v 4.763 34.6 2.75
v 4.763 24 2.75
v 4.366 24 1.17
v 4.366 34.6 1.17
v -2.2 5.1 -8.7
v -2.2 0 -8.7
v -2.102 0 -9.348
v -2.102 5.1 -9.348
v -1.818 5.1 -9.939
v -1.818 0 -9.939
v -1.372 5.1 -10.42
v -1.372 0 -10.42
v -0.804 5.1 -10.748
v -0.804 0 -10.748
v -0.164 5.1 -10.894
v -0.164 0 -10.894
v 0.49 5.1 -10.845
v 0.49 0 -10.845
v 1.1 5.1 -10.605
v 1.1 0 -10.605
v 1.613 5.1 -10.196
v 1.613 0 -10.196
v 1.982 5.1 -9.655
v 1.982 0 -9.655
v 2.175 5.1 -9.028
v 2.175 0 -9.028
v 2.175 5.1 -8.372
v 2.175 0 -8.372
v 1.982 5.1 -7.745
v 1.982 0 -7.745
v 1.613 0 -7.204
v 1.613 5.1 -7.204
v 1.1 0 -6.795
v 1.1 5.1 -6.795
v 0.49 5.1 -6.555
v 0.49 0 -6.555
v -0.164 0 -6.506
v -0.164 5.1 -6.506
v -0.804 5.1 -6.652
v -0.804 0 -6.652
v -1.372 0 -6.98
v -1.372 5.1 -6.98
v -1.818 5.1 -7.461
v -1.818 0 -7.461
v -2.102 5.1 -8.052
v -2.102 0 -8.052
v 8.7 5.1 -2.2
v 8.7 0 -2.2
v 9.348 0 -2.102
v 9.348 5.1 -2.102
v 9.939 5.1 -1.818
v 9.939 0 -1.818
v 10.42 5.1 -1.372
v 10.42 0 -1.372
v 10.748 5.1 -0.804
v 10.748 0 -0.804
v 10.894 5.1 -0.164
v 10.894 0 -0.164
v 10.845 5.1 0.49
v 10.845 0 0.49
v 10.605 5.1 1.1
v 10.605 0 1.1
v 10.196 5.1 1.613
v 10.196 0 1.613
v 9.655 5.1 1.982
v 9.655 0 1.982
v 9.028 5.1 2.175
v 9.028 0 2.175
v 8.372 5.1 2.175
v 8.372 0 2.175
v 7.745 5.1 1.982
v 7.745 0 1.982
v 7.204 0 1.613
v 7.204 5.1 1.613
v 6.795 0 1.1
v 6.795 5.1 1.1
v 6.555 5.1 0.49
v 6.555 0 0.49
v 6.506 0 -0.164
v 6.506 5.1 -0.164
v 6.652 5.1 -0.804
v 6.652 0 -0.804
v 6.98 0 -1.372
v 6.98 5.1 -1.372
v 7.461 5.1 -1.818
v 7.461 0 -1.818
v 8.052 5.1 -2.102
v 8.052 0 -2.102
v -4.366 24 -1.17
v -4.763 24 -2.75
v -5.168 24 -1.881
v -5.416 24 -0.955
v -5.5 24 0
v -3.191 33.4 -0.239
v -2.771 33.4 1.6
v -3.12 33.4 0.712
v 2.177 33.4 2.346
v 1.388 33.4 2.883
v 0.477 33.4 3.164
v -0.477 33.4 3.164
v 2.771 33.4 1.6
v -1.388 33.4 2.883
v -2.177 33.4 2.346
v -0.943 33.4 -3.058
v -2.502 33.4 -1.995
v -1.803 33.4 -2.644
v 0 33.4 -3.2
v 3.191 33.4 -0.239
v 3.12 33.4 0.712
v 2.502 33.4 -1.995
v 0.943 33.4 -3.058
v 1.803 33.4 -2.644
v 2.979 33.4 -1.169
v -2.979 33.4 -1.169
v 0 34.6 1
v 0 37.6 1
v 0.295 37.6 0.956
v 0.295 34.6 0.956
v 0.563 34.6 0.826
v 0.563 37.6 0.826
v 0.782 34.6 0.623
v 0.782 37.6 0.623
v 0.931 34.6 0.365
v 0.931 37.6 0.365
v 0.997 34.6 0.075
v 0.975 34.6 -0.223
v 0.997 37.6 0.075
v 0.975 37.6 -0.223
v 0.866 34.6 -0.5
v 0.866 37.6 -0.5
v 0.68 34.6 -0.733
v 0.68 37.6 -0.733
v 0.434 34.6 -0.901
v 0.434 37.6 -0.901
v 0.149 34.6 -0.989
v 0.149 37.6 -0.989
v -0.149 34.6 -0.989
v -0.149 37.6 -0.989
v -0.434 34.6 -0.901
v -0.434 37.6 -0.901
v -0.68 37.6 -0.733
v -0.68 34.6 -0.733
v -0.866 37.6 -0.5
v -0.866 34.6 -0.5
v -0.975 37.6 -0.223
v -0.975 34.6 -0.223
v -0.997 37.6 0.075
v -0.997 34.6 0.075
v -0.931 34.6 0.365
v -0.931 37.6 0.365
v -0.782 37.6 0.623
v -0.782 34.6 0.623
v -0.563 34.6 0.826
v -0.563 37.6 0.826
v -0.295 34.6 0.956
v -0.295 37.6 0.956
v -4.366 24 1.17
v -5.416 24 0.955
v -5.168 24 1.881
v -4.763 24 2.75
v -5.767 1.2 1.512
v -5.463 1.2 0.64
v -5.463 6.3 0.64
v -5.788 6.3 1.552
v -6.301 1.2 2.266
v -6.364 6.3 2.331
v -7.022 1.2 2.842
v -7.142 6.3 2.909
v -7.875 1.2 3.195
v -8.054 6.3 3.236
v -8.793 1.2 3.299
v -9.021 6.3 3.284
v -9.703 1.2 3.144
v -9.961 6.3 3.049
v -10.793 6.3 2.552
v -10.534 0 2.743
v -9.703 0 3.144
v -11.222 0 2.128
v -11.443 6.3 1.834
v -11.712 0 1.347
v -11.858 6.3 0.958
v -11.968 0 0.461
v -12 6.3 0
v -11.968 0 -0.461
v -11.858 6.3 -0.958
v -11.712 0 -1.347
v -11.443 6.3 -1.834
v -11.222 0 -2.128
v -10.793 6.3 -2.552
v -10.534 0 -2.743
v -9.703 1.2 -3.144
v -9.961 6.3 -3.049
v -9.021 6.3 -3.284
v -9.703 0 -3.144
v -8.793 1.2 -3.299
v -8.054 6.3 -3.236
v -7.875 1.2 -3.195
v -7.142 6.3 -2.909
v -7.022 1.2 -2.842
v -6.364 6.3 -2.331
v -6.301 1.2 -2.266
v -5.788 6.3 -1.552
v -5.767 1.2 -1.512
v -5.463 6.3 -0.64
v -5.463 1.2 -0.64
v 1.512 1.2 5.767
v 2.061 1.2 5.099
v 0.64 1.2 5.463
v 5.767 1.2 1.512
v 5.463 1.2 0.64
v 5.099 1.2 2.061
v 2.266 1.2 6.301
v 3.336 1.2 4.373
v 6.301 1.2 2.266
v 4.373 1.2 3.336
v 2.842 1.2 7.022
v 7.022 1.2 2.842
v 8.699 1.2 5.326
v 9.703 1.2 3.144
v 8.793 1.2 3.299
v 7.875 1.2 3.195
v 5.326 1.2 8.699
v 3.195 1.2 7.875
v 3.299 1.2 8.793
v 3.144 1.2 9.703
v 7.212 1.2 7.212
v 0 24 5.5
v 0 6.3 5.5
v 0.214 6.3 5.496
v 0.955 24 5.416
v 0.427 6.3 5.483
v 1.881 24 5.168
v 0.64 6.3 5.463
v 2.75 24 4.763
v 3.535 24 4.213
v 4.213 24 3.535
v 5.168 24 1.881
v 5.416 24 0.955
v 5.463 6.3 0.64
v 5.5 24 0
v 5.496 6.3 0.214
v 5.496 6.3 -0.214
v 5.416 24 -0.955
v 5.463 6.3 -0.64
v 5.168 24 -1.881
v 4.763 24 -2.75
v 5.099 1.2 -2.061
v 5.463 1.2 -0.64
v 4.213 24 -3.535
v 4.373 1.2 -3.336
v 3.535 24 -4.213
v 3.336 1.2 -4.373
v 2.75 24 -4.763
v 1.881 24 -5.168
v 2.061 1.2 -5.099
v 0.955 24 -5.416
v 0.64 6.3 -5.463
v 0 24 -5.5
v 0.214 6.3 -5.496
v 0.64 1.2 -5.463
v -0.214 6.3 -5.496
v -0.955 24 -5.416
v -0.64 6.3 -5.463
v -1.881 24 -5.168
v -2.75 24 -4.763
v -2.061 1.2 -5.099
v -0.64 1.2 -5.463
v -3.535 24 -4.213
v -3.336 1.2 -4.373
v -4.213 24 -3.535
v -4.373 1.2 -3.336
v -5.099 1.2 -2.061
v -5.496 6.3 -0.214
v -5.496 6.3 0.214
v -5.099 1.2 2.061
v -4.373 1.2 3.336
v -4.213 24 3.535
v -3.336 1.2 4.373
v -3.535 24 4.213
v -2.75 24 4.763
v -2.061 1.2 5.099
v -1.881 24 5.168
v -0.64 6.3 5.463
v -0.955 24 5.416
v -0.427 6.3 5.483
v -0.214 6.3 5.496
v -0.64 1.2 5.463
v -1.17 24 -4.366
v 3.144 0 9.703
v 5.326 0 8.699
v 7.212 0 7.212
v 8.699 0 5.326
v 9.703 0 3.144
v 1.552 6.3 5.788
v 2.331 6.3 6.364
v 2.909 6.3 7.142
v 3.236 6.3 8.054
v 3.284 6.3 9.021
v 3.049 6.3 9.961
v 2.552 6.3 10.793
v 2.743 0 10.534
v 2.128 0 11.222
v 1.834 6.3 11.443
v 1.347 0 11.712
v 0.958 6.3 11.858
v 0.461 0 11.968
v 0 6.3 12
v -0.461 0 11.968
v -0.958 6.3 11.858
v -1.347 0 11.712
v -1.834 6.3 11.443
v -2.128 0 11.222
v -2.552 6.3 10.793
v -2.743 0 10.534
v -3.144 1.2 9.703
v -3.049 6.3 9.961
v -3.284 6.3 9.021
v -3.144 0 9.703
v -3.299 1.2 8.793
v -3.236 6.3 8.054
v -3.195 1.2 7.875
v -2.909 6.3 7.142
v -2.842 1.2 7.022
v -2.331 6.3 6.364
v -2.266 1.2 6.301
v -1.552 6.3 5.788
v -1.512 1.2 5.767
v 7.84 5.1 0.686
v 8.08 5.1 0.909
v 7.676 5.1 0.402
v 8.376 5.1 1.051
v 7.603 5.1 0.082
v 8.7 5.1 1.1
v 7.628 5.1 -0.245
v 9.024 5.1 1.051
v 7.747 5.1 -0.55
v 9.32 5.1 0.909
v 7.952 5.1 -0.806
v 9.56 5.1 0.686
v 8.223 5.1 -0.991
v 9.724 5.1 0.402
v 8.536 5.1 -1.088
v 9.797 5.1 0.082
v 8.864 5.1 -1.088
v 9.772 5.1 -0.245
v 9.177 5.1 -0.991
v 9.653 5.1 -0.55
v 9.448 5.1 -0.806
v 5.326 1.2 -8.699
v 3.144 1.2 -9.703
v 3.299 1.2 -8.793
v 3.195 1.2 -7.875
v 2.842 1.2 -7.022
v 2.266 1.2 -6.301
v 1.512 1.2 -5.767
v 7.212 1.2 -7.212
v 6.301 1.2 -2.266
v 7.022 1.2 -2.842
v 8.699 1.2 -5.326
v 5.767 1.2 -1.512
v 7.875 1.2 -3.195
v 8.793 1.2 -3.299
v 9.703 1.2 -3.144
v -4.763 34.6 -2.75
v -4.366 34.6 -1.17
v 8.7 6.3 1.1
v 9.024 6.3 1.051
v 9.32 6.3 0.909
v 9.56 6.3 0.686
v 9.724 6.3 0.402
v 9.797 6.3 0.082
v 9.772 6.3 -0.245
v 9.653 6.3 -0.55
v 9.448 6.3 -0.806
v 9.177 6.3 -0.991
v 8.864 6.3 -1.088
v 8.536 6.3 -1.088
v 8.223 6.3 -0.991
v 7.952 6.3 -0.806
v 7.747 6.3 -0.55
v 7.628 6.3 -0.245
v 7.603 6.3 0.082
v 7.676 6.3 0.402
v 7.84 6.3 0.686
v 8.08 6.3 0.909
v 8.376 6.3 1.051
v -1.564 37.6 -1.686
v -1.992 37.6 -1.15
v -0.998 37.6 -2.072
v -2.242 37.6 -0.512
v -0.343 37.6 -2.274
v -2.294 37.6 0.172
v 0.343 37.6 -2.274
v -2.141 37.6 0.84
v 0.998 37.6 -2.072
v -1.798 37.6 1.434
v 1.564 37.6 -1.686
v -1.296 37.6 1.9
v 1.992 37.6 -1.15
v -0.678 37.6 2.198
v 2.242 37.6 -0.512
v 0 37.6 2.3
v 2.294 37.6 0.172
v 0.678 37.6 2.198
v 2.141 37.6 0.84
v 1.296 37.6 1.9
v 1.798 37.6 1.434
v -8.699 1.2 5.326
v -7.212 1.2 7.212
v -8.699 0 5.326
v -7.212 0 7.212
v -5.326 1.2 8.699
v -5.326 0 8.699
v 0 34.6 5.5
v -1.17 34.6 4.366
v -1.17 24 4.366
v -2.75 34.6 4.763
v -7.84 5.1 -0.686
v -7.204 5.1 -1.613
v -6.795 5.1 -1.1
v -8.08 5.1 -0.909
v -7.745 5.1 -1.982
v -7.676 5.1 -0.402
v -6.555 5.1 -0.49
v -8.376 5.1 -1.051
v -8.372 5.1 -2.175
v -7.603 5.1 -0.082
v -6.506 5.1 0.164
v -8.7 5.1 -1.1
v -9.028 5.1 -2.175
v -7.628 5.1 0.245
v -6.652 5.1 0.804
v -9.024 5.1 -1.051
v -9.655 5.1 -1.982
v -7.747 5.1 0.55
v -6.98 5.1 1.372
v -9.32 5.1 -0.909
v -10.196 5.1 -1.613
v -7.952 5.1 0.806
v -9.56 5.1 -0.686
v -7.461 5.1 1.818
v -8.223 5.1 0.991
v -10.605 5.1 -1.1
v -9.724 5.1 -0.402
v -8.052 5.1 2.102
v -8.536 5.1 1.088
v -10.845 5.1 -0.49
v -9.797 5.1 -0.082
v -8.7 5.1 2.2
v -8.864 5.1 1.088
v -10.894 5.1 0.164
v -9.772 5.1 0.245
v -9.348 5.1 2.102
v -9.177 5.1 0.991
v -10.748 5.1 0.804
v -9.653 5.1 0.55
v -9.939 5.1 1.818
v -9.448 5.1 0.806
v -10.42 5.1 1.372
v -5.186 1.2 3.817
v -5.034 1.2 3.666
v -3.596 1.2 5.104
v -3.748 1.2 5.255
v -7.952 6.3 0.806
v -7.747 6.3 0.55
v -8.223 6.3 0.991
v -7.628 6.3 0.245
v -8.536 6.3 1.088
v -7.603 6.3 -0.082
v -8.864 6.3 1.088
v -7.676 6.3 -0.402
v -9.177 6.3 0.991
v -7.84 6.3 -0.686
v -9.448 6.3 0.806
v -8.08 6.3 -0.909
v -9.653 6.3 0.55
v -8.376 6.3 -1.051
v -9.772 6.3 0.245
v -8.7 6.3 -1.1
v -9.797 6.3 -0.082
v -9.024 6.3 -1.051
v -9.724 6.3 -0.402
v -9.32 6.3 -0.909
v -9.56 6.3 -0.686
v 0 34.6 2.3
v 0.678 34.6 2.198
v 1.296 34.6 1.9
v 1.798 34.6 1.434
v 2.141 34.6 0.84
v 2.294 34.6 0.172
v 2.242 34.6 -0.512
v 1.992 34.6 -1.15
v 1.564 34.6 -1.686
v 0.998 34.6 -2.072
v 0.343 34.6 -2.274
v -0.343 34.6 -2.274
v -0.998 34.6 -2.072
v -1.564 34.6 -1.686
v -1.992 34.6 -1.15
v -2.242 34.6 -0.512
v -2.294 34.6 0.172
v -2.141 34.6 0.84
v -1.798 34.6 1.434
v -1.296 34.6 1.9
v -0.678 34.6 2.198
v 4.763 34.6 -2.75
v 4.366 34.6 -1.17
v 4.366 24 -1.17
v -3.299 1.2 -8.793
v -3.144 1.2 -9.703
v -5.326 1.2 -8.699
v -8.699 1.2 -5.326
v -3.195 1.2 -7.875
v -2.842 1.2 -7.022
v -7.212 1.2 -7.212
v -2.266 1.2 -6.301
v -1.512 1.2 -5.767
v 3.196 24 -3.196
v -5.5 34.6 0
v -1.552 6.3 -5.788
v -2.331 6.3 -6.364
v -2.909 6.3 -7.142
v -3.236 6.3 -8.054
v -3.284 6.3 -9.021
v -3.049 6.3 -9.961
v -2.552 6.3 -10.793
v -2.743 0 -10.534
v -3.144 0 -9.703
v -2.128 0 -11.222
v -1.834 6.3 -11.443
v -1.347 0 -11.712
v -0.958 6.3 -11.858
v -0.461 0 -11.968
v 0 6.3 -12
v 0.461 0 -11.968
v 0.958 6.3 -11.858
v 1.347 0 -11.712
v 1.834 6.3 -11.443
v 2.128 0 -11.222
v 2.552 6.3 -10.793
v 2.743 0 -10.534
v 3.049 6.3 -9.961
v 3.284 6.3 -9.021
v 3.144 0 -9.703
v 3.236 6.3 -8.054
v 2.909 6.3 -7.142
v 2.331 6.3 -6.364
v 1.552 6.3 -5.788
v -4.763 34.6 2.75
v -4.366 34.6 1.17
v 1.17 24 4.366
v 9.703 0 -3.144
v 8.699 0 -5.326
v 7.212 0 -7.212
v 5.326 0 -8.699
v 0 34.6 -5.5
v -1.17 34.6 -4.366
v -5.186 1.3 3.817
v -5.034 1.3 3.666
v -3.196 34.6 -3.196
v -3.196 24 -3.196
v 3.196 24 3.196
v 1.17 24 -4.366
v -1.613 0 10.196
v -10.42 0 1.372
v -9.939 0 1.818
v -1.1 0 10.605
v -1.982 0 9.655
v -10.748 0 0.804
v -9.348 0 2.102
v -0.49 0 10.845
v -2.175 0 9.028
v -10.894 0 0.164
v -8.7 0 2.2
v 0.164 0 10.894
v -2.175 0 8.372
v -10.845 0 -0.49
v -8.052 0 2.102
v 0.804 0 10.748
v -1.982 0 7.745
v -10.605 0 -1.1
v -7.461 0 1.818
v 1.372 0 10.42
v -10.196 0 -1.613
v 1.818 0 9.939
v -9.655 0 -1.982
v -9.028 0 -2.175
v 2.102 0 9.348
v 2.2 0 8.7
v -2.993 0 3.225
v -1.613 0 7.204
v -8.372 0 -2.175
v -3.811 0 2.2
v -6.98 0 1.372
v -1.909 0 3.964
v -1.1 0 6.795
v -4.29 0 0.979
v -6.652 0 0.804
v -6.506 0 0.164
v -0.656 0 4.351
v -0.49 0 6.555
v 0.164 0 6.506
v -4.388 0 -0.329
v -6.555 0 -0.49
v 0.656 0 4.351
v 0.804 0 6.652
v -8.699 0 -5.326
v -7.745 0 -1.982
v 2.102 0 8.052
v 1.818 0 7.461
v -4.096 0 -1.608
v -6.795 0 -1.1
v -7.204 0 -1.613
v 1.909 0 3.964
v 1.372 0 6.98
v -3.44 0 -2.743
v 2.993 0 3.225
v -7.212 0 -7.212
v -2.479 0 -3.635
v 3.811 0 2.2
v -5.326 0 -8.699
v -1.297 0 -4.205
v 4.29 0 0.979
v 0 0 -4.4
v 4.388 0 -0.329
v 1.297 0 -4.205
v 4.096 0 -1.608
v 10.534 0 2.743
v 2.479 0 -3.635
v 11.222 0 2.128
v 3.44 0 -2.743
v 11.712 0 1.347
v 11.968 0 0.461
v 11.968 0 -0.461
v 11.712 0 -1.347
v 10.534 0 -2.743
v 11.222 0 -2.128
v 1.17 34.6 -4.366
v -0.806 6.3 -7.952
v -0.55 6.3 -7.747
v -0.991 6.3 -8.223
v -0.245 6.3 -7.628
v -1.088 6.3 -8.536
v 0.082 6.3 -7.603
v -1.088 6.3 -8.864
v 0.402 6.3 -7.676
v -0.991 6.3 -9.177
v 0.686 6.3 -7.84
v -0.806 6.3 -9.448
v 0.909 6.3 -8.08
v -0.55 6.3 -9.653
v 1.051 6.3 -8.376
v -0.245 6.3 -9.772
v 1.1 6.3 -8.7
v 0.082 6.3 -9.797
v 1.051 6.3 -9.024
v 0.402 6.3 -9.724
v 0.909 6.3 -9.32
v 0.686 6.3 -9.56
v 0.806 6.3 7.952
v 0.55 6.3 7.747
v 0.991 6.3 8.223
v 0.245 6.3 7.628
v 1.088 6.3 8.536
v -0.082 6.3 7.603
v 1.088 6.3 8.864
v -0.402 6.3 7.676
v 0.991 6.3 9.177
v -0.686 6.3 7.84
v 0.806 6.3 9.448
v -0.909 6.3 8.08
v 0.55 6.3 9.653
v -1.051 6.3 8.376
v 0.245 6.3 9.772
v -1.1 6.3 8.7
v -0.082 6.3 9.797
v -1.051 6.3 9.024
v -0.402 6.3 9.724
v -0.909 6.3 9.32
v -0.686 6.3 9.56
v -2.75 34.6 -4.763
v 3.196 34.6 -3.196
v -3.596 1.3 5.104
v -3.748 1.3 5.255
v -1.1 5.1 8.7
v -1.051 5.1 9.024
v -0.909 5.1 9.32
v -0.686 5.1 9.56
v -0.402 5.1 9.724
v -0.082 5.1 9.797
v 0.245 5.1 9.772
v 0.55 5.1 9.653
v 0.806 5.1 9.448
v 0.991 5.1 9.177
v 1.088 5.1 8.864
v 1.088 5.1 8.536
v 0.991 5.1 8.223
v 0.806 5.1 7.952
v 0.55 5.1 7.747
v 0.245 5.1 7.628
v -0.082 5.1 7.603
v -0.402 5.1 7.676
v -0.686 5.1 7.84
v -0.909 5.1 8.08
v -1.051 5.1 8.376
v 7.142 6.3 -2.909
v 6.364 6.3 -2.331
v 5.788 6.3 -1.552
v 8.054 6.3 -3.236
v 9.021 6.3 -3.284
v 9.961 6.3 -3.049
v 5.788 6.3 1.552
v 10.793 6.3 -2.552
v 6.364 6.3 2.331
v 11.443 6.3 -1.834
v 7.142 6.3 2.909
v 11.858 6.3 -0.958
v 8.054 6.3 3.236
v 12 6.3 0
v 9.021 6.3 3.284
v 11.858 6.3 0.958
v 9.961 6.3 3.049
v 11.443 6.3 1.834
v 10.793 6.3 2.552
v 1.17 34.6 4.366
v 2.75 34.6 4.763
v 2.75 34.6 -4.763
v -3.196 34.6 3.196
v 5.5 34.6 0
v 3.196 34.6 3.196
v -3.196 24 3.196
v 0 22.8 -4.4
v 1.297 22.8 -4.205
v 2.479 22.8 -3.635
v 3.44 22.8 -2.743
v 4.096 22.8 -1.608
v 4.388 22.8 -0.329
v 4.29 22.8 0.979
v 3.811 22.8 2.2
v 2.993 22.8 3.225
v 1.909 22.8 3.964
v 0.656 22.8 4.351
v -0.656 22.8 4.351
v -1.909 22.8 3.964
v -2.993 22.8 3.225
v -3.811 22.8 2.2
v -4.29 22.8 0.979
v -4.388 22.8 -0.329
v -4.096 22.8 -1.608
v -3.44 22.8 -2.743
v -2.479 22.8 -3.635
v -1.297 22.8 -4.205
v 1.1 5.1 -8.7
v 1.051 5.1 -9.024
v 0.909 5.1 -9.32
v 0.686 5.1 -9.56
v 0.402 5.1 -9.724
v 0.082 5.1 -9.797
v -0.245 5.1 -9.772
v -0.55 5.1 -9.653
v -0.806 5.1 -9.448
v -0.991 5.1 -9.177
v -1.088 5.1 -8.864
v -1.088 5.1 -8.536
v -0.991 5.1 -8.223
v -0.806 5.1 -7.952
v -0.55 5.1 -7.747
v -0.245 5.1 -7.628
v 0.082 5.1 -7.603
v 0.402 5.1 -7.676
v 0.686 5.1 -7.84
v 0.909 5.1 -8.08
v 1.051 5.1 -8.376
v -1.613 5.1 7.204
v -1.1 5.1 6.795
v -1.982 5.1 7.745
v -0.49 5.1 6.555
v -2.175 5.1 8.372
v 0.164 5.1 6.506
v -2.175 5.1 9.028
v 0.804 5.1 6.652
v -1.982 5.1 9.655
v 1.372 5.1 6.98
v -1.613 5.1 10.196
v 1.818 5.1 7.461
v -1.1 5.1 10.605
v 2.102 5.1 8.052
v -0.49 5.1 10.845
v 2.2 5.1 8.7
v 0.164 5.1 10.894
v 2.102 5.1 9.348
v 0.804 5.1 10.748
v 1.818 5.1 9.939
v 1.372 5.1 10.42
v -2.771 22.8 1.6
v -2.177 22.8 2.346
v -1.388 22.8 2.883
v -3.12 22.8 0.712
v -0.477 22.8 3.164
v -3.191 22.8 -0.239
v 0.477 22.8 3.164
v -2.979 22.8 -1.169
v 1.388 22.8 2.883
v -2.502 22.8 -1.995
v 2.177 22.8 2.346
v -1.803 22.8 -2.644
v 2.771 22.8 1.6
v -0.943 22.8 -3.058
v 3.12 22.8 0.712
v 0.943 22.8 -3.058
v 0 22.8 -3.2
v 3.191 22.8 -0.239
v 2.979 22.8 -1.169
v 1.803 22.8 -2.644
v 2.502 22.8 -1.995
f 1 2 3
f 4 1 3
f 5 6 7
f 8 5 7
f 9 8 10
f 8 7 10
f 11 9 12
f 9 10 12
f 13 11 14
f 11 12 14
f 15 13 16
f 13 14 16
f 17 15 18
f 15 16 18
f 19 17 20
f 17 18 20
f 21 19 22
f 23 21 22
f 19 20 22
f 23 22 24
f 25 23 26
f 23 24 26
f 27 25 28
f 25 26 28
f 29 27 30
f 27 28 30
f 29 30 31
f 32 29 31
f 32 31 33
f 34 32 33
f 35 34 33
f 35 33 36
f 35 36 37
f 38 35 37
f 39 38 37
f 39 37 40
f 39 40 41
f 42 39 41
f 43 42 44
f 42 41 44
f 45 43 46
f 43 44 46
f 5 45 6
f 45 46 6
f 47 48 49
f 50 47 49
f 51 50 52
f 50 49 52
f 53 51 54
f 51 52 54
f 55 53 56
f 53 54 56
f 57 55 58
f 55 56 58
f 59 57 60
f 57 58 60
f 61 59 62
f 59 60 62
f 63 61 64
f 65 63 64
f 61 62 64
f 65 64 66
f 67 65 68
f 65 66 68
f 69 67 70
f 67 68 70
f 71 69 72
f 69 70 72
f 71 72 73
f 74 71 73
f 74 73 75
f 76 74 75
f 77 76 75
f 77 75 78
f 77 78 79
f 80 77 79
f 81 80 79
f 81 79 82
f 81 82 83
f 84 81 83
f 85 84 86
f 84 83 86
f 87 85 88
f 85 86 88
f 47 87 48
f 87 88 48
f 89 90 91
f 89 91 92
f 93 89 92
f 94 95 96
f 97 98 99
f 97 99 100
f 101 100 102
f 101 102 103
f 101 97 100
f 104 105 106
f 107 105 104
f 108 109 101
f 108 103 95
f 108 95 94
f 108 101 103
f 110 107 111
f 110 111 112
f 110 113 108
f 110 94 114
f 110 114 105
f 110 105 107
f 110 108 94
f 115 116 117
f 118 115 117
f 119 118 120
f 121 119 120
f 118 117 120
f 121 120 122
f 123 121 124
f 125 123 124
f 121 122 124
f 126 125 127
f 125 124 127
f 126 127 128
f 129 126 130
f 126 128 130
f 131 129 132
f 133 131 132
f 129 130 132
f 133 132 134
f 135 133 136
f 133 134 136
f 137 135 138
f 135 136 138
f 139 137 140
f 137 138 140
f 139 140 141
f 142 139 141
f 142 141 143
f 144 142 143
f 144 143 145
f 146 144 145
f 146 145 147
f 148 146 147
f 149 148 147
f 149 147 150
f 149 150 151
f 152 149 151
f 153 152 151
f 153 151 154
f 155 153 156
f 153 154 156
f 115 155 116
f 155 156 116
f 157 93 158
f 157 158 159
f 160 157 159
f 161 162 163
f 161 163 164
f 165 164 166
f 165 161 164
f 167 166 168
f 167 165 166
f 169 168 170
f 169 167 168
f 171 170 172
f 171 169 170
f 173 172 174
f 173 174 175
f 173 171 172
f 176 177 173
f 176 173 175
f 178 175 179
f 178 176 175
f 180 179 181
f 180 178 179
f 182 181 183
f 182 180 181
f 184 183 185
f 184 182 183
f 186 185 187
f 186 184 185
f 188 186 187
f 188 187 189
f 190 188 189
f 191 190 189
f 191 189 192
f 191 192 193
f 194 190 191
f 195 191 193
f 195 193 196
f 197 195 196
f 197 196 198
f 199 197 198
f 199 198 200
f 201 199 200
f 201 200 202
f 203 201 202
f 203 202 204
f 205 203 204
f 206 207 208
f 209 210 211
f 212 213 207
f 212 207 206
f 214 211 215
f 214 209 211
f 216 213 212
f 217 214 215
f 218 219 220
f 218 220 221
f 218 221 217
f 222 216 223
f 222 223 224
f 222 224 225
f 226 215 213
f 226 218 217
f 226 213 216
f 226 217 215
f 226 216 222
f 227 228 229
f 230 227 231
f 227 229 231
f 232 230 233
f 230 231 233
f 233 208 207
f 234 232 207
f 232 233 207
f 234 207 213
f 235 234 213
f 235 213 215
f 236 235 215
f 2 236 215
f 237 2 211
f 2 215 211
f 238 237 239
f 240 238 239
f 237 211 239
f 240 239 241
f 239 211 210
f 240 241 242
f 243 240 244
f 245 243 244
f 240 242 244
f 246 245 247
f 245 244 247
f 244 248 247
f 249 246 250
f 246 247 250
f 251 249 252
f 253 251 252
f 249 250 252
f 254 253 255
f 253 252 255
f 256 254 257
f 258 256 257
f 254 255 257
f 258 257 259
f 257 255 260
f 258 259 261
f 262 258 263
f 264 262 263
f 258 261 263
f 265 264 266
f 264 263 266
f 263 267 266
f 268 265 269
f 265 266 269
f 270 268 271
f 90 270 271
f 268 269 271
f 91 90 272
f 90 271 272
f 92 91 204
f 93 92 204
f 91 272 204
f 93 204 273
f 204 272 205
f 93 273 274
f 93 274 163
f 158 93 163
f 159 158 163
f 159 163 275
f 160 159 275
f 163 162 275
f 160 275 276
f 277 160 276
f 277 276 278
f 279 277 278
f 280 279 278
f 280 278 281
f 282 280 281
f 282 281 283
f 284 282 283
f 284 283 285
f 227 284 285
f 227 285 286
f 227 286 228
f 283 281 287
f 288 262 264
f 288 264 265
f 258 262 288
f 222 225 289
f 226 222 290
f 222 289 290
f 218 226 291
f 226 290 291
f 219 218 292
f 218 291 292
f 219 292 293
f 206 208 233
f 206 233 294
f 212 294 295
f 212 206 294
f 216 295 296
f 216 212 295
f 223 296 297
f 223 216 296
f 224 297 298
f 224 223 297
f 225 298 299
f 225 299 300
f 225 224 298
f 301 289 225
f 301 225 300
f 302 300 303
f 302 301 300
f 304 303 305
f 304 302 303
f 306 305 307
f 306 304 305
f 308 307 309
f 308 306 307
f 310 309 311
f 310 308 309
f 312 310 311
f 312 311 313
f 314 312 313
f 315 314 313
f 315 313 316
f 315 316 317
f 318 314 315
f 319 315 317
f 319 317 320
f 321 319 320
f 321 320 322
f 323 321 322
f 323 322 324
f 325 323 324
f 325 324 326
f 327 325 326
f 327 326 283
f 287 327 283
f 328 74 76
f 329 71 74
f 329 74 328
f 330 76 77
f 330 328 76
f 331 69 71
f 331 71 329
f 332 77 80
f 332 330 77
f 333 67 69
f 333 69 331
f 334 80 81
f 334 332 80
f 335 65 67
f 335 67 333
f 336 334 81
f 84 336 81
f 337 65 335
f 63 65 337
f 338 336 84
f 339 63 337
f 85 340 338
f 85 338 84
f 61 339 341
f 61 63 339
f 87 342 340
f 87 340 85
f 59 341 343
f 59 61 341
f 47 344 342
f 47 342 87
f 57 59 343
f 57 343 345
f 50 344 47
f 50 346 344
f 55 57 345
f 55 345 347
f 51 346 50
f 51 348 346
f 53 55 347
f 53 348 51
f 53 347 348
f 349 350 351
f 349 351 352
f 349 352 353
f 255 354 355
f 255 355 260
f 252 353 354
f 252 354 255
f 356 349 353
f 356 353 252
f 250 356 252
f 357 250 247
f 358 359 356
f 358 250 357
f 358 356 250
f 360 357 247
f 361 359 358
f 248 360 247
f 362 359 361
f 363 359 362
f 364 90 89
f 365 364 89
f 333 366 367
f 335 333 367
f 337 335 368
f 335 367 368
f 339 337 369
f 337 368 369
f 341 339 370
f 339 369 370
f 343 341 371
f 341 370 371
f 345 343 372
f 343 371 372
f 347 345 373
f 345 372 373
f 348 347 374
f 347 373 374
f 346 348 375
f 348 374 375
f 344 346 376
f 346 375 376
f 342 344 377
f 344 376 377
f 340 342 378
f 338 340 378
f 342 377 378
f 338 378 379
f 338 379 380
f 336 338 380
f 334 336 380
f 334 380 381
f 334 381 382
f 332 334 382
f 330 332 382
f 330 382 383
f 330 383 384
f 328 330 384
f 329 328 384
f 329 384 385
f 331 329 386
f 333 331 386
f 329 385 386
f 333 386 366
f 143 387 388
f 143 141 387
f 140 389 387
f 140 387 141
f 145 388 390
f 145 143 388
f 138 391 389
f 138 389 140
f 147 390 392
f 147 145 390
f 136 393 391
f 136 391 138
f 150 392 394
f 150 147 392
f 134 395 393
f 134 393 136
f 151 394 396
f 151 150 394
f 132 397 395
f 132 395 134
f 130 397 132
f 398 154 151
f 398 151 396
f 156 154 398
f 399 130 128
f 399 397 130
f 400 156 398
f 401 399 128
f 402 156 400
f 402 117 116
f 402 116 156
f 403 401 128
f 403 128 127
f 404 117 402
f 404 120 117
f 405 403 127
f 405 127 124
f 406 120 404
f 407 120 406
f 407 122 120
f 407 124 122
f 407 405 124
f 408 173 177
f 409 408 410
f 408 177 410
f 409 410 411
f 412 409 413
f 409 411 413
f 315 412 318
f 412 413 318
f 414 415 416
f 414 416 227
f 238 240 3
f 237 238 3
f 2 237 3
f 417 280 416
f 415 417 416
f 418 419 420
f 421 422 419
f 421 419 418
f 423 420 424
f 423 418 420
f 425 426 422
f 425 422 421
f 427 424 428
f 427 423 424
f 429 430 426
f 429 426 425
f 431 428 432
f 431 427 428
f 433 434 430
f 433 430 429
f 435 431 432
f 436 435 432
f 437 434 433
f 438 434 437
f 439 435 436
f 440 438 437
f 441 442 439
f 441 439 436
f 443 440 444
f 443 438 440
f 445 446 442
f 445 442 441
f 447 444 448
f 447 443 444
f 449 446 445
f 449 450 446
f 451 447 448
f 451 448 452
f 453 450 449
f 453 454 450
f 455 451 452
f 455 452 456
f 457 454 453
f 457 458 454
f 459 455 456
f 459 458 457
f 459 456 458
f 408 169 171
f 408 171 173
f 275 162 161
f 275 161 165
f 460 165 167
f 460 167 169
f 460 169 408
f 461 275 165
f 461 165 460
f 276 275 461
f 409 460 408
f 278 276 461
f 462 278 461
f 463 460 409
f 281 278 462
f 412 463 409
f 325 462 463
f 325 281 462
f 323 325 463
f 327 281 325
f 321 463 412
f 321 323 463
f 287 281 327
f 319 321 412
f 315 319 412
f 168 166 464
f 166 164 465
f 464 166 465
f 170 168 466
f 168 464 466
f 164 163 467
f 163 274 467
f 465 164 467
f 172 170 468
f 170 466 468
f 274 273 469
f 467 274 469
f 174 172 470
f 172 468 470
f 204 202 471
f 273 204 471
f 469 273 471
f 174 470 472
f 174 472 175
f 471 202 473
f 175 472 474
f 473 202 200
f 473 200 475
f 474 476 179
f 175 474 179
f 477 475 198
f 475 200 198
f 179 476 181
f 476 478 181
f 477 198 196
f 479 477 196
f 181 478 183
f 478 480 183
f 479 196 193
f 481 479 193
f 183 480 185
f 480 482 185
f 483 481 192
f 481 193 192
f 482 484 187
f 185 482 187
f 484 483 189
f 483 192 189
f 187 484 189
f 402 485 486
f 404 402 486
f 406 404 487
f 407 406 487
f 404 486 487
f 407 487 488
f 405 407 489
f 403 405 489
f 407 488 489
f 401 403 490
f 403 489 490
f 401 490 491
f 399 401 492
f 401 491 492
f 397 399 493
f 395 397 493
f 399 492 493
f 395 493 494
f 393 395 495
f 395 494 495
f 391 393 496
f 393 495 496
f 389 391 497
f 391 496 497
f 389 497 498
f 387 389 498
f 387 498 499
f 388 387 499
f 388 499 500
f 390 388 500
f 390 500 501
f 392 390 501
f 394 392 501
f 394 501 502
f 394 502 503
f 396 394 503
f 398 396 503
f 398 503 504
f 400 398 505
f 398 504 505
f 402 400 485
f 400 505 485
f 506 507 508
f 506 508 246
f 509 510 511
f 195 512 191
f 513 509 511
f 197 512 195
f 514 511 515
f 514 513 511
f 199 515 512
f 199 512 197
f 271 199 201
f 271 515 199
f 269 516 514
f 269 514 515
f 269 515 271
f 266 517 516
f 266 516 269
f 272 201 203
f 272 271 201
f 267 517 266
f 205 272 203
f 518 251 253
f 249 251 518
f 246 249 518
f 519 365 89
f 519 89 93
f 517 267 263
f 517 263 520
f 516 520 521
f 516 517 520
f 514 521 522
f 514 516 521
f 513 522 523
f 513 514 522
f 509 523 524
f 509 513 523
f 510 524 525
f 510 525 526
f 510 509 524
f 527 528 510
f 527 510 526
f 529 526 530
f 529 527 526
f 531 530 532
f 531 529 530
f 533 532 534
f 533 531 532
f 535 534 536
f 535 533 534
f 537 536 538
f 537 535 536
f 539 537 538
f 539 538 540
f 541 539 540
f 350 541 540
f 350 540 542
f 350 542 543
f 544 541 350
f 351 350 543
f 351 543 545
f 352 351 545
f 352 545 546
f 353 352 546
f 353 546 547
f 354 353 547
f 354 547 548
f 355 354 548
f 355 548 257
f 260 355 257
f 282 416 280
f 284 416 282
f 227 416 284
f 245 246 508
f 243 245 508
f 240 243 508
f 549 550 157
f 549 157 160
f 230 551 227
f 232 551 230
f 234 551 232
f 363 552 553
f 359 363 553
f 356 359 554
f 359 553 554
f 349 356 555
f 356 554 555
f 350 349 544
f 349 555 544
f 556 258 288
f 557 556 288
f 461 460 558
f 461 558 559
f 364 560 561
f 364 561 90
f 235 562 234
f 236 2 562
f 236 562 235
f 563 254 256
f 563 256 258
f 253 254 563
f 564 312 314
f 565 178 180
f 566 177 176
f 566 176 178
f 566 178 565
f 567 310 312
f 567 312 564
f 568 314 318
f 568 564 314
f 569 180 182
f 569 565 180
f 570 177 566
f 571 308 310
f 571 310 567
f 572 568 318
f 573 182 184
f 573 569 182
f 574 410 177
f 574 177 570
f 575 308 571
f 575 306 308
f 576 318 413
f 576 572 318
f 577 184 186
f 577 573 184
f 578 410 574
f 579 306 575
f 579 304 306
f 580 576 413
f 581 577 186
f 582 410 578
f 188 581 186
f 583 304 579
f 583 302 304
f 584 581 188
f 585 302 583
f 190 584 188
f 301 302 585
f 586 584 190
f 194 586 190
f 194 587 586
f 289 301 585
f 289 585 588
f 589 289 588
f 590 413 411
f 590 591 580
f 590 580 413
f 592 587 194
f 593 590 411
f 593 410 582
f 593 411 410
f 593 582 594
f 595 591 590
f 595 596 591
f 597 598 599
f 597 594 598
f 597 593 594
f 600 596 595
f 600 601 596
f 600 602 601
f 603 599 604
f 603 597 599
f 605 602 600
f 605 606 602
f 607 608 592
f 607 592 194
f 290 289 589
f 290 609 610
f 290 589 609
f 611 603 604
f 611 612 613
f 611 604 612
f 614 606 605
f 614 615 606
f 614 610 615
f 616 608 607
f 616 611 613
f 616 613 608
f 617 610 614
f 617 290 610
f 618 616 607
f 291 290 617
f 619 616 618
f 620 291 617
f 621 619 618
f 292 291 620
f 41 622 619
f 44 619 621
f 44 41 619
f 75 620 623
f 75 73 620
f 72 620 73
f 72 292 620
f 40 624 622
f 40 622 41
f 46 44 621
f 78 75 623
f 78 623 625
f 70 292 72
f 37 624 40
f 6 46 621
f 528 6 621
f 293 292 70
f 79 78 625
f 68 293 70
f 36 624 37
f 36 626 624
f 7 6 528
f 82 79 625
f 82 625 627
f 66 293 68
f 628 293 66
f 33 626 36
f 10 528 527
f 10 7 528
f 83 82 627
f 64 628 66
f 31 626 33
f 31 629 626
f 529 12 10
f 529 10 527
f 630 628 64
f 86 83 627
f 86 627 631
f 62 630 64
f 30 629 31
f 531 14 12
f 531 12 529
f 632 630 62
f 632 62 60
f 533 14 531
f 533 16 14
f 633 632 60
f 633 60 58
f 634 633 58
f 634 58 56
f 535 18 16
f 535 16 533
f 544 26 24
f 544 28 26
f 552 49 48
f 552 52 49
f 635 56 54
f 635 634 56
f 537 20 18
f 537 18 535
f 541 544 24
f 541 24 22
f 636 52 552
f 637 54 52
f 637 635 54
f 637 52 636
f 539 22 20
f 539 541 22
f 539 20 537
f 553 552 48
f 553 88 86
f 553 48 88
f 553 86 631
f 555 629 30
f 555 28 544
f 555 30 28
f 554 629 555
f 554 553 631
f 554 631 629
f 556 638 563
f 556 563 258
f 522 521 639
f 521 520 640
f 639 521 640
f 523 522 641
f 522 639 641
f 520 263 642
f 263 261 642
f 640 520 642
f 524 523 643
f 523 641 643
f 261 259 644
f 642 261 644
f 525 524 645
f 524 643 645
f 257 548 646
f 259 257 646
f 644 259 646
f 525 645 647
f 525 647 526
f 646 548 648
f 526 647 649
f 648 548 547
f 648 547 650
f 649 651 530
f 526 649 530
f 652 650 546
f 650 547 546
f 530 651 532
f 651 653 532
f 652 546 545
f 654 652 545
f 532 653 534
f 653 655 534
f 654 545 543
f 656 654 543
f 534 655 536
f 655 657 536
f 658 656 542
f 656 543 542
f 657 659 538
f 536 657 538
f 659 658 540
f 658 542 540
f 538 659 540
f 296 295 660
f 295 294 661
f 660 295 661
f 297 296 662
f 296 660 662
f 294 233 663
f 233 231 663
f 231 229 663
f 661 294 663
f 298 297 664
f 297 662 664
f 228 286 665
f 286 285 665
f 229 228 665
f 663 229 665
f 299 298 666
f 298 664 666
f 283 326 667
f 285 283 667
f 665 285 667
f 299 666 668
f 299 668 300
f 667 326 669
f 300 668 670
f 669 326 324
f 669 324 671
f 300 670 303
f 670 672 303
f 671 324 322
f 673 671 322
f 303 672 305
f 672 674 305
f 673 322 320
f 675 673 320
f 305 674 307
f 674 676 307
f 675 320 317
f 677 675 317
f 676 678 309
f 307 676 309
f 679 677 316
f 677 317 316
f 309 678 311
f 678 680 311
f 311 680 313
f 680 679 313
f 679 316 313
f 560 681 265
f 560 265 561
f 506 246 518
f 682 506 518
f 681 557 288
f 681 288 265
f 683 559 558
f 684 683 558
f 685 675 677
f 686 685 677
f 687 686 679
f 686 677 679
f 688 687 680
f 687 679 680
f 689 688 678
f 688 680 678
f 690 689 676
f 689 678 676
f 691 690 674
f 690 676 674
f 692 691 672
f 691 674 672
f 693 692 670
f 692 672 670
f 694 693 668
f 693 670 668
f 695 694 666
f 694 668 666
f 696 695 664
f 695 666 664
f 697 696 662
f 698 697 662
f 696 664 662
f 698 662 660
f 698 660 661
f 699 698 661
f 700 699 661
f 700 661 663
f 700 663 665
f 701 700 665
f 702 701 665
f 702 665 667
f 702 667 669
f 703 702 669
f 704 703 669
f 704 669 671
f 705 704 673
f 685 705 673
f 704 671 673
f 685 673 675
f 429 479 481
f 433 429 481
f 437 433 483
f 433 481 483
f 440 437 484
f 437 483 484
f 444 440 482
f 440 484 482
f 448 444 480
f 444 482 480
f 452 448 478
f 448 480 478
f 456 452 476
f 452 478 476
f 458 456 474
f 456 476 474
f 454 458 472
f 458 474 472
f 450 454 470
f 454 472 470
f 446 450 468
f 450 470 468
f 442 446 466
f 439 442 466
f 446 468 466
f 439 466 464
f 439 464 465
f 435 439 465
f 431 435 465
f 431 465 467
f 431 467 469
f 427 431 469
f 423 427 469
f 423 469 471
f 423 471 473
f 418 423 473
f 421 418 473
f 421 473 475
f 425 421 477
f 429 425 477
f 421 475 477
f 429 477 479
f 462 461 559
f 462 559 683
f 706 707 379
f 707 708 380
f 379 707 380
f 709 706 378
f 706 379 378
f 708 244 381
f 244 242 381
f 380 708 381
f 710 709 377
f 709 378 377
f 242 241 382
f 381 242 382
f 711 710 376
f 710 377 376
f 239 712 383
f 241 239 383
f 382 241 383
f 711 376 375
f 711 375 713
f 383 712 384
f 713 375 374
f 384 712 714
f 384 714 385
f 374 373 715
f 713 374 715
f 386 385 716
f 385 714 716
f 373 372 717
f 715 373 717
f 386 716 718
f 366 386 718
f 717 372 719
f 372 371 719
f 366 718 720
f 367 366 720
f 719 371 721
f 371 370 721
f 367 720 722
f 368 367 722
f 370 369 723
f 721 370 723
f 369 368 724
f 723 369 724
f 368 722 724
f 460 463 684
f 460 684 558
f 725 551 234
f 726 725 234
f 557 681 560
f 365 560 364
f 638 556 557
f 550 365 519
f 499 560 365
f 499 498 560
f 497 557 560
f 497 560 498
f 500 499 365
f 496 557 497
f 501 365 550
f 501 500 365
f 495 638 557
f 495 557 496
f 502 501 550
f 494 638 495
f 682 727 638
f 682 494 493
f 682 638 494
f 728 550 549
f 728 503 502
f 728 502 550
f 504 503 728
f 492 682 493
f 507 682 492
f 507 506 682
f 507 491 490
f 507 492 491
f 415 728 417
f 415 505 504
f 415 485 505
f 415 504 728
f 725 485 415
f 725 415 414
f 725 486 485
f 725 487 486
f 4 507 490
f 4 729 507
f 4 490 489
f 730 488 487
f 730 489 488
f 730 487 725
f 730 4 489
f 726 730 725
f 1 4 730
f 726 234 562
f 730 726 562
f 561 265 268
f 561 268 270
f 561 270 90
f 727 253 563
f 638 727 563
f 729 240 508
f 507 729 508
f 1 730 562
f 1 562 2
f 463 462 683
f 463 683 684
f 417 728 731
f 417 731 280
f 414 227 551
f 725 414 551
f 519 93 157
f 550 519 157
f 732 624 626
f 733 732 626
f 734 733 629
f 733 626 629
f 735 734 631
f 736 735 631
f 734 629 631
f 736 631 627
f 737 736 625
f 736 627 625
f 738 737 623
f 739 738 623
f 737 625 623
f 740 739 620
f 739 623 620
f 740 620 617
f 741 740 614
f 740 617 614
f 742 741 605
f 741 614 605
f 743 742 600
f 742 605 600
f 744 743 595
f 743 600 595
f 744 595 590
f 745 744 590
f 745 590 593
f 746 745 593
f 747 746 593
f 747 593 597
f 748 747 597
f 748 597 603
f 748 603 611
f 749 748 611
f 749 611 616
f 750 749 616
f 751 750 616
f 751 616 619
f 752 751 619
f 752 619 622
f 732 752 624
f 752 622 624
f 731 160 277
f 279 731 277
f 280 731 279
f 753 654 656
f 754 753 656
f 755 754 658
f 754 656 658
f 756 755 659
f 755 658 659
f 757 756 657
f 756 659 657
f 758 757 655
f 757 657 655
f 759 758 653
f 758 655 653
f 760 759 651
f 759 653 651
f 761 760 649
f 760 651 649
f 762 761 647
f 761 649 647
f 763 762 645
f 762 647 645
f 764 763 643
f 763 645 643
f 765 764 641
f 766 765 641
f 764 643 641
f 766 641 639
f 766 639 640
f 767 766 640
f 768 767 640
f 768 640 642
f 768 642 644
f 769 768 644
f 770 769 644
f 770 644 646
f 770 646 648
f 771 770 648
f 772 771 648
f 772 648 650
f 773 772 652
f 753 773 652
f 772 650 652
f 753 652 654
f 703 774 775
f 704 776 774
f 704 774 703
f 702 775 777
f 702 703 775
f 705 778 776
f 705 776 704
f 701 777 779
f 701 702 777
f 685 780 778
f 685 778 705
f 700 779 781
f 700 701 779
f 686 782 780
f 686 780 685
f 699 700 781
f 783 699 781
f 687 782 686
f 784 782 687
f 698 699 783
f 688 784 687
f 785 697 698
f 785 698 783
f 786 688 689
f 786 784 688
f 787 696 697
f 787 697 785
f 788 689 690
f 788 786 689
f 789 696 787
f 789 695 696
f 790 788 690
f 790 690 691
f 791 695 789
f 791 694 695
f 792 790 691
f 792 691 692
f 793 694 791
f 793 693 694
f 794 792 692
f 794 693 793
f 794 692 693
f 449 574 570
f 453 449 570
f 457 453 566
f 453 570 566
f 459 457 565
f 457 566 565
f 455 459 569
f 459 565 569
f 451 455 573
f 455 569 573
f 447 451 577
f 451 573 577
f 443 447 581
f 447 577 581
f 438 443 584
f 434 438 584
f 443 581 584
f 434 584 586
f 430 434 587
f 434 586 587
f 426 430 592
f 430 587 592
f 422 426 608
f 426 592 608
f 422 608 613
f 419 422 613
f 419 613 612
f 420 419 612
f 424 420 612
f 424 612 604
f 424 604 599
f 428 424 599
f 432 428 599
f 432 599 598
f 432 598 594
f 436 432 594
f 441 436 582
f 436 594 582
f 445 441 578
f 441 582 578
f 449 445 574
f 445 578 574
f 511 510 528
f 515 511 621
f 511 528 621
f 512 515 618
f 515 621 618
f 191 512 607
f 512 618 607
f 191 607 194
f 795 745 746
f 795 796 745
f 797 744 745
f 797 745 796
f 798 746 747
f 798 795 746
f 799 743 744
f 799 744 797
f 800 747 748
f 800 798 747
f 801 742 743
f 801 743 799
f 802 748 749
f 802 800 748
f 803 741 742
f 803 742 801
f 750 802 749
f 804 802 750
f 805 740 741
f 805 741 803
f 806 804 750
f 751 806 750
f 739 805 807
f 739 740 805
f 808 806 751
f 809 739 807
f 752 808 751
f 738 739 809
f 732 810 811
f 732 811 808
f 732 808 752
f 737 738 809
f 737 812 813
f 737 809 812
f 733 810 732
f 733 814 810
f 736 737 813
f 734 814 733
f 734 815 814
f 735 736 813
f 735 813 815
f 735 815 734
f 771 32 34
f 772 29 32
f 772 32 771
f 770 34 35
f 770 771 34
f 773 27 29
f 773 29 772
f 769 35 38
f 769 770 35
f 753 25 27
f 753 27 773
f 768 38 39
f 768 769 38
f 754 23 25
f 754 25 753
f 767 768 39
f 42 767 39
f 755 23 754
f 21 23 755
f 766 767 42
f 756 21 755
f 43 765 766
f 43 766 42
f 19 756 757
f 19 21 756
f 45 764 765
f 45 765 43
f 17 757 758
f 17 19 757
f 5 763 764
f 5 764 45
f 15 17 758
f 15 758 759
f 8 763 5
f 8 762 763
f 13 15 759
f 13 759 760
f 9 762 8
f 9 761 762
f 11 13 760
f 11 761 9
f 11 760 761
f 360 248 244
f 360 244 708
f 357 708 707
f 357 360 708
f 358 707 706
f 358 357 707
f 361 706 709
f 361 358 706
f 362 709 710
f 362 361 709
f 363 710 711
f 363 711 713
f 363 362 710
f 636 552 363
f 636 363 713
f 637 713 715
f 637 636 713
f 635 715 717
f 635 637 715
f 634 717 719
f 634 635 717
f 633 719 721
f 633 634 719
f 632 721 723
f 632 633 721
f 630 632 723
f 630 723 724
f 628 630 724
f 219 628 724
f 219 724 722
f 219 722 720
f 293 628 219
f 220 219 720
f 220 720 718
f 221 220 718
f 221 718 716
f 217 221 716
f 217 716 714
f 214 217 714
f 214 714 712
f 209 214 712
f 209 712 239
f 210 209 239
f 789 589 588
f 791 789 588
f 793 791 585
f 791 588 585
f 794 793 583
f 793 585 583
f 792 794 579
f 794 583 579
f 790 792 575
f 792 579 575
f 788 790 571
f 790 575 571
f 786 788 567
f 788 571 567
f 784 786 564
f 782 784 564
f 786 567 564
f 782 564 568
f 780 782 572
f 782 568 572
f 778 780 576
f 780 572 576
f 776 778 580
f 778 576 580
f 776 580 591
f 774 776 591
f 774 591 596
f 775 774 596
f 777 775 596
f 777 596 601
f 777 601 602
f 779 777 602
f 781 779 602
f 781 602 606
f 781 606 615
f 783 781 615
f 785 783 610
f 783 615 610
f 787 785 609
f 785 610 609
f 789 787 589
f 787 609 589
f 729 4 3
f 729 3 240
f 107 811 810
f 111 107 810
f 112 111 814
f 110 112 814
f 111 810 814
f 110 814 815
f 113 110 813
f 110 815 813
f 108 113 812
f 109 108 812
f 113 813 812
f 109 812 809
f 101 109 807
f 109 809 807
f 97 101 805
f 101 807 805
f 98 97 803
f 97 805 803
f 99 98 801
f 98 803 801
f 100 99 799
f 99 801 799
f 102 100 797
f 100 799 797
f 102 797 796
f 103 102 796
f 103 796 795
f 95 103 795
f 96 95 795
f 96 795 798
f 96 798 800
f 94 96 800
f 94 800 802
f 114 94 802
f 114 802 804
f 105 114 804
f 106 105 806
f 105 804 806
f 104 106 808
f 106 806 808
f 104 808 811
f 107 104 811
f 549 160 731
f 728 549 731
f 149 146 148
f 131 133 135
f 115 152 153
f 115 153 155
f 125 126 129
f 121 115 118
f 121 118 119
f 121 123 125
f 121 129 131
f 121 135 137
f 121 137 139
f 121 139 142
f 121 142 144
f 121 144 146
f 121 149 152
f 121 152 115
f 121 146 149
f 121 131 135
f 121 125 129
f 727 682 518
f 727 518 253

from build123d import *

# Parameters (mm, degrees)
SKETCH1_R            = 10.2
BOSS_EXTRUDE1_DEPTH  = 1.2
SKETCH3_R            = 5.5
BOSS_EXTRUDE2_DEPTH  = 22.8
SKETCH6_R            = 3.3
BOSS_EXTRUDE7_DEPTH  = 6.3
SKETCH7_R            = 2.2
CUT_EXTRUDE1_DEPTH   = 5.1
SKETCH8_R            = 1.1
CUT_EXTRUDE2_DEPTH   = 1.2
CIRPATTERN1_COUNT    = 4
SKETCH9_R            = 4.4
CUT_EXTRUDE3_DEPTH   = 22.8
SKETCH10_R           = 4.5
BOSS_EXTRUDE8_DEPTH  = 10.6
BOSS_EXTRUDE9_DEPTH  = 10.6
CIRPATTERN2_COUNT    = 12
SKETCH12_R           = 3.2
CUT_EXTRUDE4_DEPTH   = 10.6
SKETCH13_R           = 2.3
BOSS_EXTRUDE10_DEPTH = 3
SKETCH14_R           = 1
CUT_EXTRUDE5_DEPTH   = 3
BOSS_EXTRUDE11_DEPTH = 0.1


with BuildPart() as part:
    # Sketch1 → Boss-Extrude1 (new body)
    with BuildSketch(Plane(origin=(0, 0, 0), x_dir=(1, 0, 0), z_dir=(0, 1, 0))):
        Circle(SKETCH1_R)
    extrude(amount=BOSS_EXTRUDE1_DEPTH)

    # Sketch3 → Boss-Extrude2 (add)
    with BuildSketch(Plane(origin=(0, 1.2, 0), x_dir=(1, 0, 0), z_dir=(0, 1, 0))):
        Circle(SKETCH3_R)
    extrude(amount=BOSS_EXTRUDE2_DEPTH)

    # Sketch6 → Boss-Extrude7 (add)
    with BuildSketch(Plane.XZ):
        with Locations((8.7, 0)):
            Circle(SKETCH6_R)
    boss_extrude7 = extrude(amount=-BOSS_EXTRUDE7_DEPTH)

    # Sketch7 → Cut-Extrude1 (cut)
    with BuildSketch(Plane.XZ):
        with Locations((8.7, 0)):
            Circle(SKETCH7_R)
    cut_extrude1 = extrude(amount=-CUT_EXTRUDE1_DEPTH, mode=Mode.SUBTRACT)

    # Sketch8 → Cut-Extrude2 (cut)
    with BuildSketch(Plane(origin=(0, 6.3, 0), x_dir=(1, 0, 0), z_dir=(0, 1, 0))):
        with Locations((8.7, 0)):
            Circle(SKETCH8_R)
    cut_extrude2 = extrude(amount=-CUT_EXTRUDE2_DEPTH, mode=Mode.SUBTRACT)

    # CirPattern1: Boss-Extrude7, Cut-Extrude1, Cut-Extrude2 ×4 about axis
    cirpattern1_axis = Axis((0, 25.2, 0), (0, -1, 0))
    add([boss_extrude7.rotate(cirpattern1_axis, i * 360 / CIRPATTERN1_COUNT) for i in range(1, CIRPATTERN1_COUNT)])
    add([cut_extrude1.rotate(cirpattern1_axis, i * 360 / CIRPATTERN1_COUNT) for i in range(1, CIRPATTERN1_COUNT)], mode=Mode.SUBTRACT)
    add([cut_extrude2.rotate(cirpattern1_axis, i * 360 / CIRPATTERN1_COUNT) for i in range(1, CIRPATTERN1_COUNT)], mode=Mode.SUBTRACT)

    # Sketch9 → Cut-Extrude3 (cut)
    with BuildSketch(Plane(origin=(0, 0, 0), x_dir=(-1, 0, 0), z_dir=(0, -1, 0))):
        Circle(SKETCH9_R)
    extrude(amount=-CUT_EXTRUDE3_DEPTH, mode=Mode.SUBTRACT)

    # Sketch10 → Boss-Extrude8 (add)
    with BuildSketch(Plane(origin=(0, 24, 0), x_dir=(1, 0, 0), z_dir=(0, 1, 0))):
        Circle(SKETCH10_R)
    extrude(amount=BOSS_EXTRUDE8_DEPTH)

    # Sketch11 → Boss-Extrude9 (add)
    with BuildSketch(Plane(origin=(0, 24, 0), x_dir=(1, 0, 0), z_dir=(0, 1, 0))):
        Polygon((-1.2, 4.337049688), (1.2, 4.337049688), (0, 5.5), align=None)
    boss_extrude9 = extrude(amount=BOSS_EXTRUDE9_DEPTH)

    # CirPattern2: Boss-Extrude9 ×12 about axis
    cirpattern2_axis = Axis((0, 25.2, 0), (0, -1, 0))
    for i in range(1, CIRPATTERN2_COUNT):
        add(boss_extrude9.rotate(cirpattern2_axis, i * 360 / CIRPATTERN2_COUNT))

    # Sketch12 → Cut-Extrude4 (cut)
    with BuildSketch(Plane.XZ.offset(-22.8)):
        Circle(SKETCH12_R)
    extrude(amount=-CUT_EXTRUDE4_DEPTH, mode=Mode.SUBTRACT)

    # Sketch13 → Boss-Extrude10 (add)
    with BuildSketch(Plane(origin=(0, 34.6, 0), x_dir=(1, 0, 0), z_dir=(0, 1, 0))):
        Circle(SKETCH13_R)
    extrude(amount=BOSS_EXTRUDE10_DEPTH)

    # Sketch14 → Cut-Extrude5 (cut)
    with BuildSketch(Plane(origin=(0, 37.6, 0), x_dir=(1, 0, 0), z_dir=(0, 1, 0))):
        Circle(SKETCH14_R)
    extrude(amount=-CUT_EXTRUDE5_DEPTH, mode=Mode.SUBTRACT)

    # Sketch15 → Boss-Extrude11 (add)
    with BuildSketch(Plane(origin=(0, 1.2, 0), x_dir=(1, 0, 0), z_dir=(0, 1, 0))):
        Polygon((-5.03433242, -3.66566758), (-3.596315227, -5.103684773), (-3.748047753, -5.2554173), (-5.186064947, -3.817400106), align=None)
    extrude(amount=BOSS_EXTRUDE11_DEPTH)


solid = part.part
